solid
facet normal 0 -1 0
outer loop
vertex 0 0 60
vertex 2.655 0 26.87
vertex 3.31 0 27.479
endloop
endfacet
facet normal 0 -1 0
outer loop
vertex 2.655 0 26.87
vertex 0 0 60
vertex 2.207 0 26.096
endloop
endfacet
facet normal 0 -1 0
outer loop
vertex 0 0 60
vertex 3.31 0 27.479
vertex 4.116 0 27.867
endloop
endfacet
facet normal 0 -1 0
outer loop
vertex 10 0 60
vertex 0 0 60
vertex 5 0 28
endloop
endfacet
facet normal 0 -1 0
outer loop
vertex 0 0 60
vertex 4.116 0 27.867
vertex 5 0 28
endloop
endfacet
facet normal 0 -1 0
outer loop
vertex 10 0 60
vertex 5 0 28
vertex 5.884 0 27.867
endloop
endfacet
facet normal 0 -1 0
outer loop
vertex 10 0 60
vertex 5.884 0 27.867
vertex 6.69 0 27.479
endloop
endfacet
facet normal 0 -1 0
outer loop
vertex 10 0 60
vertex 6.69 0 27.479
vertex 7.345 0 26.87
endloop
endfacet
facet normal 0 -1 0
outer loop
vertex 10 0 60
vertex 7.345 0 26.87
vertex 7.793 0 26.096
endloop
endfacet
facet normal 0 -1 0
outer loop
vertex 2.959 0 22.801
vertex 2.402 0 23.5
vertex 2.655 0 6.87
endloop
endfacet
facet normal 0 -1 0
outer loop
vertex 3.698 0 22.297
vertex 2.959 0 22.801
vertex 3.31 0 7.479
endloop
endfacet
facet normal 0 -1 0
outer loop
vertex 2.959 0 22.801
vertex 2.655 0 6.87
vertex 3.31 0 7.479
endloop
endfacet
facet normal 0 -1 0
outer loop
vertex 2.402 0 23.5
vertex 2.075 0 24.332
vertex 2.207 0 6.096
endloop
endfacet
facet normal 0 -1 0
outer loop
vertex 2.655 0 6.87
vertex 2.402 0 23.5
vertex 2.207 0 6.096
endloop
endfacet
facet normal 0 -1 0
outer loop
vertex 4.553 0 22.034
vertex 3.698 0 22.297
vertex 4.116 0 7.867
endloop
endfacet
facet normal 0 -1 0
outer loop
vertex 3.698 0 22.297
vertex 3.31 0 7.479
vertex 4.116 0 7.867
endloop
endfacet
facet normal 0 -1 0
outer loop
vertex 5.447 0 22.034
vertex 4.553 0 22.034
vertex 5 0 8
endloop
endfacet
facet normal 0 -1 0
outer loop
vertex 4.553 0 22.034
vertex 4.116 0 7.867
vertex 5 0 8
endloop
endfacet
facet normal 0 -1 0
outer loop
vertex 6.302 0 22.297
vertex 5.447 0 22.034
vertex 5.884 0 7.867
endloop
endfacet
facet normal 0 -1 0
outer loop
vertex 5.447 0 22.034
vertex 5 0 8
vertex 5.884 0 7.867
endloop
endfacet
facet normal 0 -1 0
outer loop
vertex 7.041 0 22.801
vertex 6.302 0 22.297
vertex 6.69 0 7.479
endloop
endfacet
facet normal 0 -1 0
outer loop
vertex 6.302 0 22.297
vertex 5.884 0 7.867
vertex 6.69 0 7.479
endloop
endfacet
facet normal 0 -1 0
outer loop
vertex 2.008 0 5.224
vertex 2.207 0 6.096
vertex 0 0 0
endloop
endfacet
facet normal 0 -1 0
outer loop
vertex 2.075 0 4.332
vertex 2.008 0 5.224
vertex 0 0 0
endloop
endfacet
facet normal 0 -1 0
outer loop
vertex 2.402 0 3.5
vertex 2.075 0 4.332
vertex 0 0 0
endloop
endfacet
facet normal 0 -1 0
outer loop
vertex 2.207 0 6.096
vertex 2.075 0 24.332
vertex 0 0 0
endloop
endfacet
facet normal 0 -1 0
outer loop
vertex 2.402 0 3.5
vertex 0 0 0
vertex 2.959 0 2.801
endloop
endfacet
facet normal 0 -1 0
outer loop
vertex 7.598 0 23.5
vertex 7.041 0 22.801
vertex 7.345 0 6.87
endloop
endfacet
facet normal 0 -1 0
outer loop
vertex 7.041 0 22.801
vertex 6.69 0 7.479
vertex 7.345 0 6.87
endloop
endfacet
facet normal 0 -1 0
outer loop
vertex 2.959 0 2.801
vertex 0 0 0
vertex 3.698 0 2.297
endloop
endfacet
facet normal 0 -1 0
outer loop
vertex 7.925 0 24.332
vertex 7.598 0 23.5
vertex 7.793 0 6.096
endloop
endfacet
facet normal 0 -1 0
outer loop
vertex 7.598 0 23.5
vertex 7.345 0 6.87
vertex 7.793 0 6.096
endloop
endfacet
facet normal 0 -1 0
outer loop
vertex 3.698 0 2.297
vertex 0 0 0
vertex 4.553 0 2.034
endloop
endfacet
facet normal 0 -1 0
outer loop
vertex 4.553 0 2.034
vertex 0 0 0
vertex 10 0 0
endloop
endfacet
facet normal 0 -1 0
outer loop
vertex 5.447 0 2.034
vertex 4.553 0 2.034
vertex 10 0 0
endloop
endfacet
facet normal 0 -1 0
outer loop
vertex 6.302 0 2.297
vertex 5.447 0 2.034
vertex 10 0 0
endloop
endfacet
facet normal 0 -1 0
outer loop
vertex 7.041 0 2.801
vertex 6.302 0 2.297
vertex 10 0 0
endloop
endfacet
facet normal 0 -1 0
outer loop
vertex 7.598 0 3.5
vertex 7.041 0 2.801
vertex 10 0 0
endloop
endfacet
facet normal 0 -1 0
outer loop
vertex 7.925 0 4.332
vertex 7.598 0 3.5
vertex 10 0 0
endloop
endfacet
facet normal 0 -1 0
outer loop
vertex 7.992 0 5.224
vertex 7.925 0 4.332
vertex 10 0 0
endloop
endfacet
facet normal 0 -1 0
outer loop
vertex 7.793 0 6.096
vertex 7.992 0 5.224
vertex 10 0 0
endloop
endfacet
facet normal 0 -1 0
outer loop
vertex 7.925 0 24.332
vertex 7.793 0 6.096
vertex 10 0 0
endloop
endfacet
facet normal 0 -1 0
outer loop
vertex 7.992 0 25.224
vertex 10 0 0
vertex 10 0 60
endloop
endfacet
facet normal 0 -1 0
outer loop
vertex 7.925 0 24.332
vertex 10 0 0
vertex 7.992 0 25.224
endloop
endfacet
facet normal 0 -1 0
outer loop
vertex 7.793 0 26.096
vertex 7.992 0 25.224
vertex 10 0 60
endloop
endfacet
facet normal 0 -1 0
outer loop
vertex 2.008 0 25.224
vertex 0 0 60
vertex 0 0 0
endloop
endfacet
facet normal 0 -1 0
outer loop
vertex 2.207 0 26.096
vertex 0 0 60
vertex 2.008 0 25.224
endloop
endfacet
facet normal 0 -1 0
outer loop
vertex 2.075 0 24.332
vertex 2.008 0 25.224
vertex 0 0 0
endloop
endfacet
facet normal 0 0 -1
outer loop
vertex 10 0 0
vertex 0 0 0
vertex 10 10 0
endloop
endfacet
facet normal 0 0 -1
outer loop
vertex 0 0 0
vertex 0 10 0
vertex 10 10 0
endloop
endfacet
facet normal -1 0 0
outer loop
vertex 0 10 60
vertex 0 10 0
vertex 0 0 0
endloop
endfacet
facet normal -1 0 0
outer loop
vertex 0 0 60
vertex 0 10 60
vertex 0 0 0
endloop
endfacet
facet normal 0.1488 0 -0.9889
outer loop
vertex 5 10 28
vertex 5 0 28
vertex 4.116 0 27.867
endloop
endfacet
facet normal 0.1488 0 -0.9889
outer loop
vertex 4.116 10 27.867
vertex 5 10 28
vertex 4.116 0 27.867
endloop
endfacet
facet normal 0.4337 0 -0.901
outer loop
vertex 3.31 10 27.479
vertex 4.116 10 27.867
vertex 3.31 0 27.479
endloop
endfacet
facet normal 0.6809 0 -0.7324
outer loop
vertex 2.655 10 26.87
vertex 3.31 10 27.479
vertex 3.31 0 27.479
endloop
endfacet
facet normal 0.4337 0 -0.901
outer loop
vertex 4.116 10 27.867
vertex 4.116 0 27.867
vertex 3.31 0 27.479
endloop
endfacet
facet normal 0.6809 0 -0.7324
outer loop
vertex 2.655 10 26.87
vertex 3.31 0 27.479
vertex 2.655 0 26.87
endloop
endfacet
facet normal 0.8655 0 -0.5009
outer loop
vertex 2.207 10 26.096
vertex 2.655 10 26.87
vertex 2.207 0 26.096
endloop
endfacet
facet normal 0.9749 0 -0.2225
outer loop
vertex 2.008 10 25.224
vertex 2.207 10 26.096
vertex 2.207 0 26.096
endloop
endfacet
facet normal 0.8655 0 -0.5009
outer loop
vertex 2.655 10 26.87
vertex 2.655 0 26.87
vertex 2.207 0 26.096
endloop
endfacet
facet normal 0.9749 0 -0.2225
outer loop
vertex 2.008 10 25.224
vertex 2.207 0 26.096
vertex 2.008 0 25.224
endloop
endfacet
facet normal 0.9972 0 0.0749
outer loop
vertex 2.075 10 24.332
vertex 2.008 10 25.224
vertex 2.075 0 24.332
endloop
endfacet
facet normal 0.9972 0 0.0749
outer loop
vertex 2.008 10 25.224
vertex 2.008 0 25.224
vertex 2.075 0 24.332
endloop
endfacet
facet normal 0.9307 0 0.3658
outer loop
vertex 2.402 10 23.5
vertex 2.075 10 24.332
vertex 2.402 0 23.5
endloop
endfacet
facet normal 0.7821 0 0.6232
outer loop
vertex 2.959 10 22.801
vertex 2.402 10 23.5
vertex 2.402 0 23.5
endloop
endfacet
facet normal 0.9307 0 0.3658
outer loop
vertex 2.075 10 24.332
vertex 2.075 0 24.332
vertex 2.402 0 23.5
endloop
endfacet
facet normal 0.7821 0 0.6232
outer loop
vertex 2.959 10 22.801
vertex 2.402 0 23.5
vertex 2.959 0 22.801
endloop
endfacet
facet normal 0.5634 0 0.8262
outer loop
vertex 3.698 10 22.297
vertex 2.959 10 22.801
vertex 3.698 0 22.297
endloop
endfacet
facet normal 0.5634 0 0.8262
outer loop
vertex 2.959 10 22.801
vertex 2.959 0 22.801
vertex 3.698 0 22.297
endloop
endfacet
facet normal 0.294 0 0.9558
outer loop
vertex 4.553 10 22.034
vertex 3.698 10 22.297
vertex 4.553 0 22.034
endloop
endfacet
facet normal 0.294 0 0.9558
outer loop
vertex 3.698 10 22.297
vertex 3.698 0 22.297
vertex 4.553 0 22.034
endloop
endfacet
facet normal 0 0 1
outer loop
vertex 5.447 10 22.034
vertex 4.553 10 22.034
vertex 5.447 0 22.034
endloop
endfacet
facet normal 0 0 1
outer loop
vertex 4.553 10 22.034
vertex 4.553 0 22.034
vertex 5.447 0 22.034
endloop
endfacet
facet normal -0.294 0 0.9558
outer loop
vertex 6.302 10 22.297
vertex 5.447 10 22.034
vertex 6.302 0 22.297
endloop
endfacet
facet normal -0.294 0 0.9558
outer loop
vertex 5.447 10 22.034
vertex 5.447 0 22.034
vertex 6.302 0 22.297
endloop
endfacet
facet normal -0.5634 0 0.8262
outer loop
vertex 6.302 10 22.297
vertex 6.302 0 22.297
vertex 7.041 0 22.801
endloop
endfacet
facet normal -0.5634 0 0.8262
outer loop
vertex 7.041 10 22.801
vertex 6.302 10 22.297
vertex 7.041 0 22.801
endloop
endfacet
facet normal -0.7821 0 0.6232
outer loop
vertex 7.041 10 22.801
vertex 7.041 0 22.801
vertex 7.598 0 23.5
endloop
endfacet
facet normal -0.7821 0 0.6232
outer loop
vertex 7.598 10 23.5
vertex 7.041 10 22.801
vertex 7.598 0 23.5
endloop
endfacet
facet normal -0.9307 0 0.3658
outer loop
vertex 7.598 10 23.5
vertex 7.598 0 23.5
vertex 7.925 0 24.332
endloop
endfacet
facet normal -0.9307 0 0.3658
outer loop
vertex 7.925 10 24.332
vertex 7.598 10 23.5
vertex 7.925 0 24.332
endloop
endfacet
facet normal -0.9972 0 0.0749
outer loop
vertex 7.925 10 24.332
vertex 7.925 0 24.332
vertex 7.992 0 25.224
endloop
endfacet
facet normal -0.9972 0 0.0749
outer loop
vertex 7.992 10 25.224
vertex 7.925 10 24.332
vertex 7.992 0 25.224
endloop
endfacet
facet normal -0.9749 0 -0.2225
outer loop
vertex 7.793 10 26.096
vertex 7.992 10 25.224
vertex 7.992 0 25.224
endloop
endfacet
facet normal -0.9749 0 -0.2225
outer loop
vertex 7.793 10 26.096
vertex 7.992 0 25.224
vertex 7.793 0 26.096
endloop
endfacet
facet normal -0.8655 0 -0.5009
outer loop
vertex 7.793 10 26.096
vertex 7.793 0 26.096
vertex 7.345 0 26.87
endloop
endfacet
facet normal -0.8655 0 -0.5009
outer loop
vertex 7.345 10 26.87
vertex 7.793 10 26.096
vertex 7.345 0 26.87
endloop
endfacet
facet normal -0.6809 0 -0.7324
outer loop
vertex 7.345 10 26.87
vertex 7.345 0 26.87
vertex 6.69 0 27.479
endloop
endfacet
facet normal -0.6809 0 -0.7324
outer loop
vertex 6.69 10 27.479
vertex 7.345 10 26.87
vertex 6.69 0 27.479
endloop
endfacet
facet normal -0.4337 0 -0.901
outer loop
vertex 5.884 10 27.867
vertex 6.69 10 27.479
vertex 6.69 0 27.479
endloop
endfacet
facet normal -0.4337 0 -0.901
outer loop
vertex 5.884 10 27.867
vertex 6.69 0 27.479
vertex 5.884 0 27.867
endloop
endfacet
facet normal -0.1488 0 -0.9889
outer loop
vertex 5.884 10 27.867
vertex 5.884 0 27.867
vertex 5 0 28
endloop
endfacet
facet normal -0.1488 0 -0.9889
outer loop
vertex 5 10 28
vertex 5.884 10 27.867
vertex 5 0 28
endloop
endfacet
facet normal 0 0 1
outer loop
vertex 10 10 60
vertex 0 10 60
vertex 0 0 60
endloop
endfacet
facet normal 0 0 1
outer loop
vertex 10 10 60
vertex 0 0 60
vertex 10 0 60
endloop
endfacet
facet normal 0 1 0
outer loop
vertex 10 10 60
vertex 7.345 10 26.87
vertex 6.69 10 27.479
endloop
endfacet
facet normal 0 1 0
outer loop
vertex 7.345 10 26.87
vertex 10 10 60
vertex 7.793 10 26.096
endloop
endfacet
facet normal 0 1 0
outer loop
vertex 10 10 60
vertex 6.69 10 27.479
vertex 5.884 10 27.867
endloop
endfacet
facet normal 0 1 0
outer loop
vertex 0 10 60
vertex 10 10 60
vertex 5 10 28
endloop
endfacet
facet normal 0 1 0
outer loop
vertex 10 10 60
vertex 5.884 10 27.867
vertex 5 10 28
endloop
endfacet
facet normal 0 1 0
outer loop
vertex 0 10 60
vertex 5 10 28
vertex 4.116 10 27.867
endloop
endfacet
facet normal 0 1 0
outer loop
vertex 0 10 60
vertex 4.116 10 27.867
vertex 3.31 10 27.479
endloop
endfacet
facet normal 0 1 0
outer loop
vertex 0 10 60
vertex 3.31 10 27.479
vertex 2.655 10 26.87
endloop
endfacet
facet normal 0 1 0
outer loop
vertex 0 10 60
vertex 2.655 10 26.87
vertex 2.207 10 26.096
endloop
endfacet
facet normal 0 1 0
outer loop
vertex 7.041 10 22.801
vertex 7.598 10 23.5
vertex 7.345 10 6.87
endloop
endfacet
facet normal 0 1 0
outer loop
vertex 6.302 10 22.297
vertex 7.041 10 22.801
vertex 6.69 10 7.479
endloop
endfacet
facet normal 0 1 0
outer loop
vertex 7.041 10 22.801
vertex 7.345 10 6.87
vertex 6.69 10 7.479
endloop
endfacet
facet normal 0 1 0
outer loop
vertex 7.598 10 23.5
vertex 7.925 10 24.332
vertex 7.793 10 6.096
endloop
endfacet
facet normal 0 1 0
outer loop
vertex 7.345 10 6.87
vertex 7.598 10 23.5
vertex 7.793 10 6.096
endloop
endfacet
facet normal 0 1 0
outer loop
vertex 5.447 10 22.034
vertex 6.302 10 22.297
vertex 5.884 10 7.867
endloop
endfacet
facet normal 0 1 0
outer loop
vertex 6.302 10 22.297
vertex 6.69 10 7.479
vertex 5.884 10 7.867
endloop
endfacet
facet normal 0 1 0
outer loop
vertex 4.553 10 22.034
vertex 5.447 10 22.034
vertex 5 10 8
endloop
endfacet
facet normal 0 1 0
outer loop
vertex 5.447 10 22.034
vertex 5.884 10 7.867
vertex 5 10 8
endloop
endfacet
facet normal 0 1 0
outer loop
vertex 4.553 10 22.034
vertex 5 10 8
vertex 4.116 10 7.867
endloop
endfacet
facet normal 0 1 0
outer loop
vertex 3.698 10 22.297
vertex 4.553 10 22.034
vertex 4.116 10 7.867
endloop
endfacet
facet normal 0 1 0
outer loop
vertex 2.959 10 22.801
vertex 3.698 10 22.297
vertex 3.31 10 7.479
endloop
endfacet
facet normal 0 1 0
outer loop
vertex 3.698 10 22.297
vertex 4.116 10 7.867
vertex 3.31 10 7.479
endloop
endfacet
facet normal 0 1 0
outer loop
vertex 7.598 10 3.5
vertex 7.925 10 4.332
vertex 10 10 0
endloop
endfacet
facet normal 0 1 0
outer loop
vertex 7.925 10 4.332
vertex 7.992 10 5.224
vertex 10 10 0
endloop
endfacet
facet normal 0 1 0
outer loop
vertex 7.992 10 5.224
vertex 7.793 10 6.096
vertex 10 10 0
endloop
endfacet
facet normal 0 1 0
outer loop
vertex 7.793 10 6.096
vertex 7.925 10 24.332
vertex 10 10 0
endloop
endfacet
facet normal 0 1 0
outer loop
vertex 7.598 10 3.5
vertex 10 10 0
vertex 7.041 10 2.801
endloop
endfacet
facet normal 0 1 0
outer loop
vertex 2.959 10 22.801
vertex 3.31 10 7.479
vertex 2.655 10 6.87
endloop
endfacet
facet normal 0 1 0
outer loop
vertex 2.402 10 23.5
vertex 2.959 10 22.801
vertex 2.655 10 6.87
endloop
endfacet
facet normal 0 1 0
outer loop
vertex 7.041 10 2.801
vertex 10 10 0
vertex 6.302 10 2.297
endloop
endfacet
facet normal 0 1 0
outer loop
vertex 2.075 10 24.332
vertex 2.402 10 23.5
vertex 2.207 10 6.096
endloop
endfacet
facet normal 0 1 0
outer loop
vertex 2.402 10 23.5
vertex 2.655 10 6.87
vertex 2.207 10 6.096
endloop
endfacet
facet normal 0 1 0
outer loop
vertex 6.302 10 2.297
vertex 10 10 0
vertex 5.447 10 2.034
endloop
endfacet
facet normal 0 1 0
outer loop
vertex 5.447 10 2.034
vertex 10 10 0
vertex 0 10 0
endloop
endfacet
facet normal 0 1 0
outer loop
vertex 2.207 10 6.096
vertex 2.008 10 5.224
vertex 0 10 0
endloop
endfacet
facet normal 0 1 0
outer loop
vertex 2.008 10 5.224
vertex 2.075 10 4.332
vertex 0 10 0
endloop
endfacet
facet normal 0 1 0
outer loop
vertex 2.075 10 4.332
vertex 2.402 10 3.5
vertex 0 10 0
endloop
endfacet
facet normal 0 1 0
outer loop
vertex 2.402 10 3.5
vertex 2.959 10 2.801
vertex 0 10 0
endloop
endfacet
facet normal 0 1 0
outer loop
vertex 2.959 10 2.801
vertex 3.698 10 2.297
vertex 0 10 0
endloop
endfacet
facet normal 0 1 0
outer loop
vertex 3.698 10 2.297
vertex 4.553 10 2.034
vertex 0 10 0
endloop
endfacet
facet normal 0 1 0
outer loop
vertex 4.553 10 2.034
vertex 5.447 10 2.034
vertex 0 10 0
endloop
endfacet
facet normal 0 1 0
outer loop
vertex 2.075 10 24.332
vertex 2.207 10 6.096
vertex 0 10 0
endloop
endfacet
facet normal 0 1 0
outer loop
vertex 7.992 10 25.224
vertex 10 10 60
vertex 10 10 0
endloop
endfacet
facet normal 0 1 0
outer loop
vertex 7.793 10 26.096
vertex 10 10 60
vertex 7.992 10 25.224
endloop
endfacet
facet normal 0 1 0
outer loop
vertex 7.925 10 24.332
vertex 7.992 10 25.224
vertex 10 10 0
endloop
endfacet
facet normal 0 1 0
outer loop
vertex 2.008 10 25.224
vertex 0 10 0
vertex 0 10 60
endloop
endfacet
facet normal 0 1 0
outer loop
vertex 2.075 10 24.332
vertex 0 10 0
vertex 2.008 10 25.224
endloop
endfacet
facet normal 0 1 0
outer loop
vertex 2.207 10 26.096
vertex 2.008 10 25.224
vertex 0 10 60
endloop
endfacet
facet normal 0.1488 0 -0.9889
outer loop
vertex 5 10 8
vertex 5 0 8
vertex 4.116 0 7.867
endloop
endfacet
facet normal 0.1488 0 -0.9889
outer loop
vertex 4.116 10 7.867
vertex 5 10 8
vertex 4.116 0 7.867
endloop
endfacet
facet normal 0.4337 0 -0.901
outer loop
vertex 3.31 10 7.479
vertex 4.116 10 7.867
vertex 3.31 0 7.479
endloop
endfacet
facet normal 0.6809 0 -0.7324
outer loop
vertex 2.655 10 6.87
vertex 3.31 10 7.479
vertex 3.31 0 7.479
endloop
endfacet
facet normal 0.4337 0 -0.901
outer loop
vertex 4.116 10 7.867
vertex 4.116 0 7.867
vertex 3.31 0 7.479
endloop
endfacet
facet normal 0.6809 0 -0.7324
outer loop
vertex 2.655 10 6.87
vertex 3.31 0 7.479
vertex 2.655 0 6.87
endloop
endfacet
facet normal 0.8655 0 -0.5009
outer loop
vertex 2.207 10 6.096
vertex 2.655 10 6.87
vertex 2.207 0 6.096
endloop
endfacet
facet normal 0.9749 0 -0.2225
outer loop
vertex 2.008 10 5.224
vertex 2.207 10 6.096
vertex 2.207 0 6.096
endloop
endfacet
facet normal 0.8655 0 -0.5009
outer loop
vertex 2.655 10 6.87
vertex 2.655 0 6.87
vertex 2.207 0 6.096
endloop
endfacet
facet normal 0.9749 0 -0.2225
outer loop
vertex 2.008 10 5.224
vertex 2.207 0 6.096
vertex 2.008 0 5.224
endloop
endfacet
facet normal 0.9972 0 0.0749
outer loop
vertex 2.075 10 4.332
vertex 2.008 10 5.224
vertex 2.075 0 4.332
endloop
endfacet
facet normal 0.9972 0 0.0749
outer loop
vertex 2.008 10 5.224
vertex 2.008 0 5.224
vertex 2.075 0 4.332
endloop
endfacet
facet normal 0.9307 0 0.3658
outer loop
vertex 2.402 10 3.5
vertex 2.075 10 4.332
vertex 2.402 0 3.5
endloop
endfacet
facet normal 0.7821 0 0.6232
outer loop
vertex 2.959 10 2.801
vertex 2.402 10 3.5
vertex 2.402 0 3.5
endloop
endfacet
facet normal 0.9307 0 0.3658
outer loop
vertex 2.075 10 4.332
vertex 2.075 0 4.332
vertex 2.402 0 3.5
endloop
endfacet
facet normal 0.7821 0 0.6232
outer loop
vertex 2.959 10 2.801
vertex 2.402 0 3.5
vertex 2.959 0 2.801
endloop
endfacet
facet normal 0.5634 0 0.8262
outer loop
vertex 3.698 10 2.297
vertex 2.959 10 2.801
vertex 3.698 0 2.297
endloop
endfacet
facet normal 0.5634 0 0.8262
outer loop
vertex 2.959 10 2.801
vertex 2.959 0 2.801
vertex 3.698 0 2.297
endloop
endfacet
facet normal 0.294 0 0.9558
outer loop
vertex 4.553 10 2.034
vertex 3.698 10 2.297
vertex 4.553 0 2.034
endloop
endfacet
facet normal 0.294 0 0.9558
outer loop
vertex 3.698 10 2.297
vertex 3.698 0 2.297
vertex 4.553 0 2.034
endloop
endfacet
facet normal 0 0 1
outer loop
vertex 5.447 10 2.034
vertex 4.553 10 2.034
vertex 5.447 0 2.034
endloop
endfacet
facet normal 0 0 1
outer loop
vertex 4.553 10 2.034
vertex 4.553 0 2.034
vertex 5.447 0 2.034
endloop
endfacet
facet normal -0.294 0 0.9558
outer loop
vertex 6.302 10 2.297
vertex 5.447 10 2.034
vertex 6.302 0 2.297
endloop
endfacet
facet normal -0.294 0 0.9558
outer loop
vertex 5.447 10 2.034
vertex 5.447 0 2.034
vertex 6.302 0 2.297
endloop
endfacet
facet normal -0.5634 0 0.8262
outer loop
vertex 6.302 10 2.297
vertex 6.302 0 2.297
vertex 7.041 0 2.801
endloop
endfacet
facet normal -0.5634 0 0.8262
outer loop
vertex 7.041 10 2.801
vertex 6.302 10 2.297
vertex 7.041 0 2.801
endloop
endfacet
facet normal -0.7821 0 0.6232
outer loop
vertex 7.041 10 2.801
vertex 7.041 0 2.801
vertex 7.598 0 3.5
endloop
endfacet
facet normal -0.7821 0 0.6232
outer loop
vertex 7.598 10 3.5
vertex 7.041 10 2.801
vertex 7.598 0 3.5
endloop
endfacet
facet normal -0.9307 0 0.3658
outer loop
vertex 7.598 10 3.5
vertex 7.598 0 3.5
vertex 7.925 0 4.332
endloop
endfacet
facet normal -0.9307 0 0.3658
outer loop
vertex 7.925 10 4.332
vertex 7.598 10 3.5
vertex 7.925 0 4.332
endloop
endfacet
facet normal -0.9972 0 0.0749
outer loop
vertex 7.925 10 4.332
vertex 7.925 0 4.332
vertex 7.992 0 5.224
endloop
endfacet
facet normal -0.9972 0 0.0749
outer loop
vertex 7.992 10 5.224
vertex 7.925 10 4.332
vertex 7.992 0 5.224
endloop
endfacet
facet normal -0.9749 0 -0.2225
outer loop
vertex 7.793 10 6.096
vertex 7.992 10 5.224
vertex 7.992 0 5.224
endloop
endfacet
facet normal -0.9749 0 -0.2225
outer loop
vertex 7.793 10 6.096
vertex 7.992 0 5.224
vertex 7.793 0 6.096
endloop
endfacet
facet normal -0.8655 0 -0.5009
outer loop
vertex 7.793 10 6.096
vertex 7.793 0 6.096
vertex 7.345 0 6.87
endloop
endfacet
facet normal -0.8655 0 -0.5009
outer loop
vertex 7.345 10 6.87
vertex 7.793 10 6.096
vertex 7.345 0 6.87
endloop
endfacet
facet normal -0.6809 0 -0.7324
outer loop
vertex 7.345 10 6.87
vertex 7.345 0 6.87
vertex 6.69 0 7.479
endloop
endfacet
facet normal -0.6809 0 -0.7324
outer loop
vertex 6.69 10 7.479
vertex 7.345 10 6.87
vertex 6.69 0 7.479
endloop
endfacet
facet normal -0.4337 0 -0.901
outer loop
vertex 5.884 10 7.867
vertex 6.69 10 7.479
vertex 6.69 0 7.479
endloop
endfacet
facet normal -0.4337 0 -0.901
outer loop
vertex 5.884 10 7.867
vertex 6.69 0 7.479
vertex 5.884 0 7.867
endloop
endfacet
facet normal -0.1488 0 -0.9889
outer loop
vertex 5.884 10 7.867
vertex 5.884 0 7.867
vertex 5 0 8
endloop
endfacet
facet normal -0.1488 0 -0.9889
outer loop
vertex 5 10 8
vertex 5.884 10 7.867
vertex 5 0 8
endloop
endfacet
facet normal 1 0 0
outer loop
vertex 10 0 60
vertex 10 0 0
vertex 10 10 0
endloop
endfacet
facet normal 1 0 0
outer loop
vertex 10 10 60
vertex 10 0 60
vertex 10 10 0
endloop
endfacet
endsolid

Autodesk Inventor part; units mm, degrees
ref_plane "YZ Plane" through (0, 0, 0) normal (1, 0, 0) x (0, 1, 0)
ref_plane "XZ Plane" through (0, 0, 0) normal (0, 1, 0) x (-1, 0, 0)
ref_plane "XY Plane" through (0, 0, 0) normal (0, 0, 1) x (1, 0, 0)
sketch "スケッチ1" plane through (0, 0, 0) normal (0, 0, 1) x (1, 0, 0)
  line L0 (0, 0) -> (10, 0)
  line L1 (10, 0) -> (10, 10)
  line L2 (10, 10) -> (0, 10)
  line L3 (0, 10) -> (0, 0)
  dimension "d0" = 10
  dimension "d1" = 10
extrude "押し出し1" add sketch "スケッチ1" along normal blind 60
sketch "スケッチ2" plane through (0, 10, 0) normal (0, 1, 0) x (1, 0, 0)
  line L0 (0, 0) -> (0, -60) projected
  line L1 (10, 0) -> (0, 0) projected
  point P0 (5, -5)
  dimension "d4" = 5
  dimension "d5" = 5
hole "穴1" at (5, 10, 5) direction (0, -1, 0) diameter 6 end through all
sketch "スケッチ3" plane through (0, 10, 0) normal (0, 1, 0) x (1, 0, 0)
  line L0 (0, 0) -> (0, -60) projected
  line L1 (10, 0) -> (0, 0) projected
  point P0 (5, -25)
  dimension "d13" = 5
  dimension "d14" = 25
hole "穴2" at (5, 10, 25) direction (0, -1, 0) diameter 6 end through all
properties part number "アーム10×10×60"
